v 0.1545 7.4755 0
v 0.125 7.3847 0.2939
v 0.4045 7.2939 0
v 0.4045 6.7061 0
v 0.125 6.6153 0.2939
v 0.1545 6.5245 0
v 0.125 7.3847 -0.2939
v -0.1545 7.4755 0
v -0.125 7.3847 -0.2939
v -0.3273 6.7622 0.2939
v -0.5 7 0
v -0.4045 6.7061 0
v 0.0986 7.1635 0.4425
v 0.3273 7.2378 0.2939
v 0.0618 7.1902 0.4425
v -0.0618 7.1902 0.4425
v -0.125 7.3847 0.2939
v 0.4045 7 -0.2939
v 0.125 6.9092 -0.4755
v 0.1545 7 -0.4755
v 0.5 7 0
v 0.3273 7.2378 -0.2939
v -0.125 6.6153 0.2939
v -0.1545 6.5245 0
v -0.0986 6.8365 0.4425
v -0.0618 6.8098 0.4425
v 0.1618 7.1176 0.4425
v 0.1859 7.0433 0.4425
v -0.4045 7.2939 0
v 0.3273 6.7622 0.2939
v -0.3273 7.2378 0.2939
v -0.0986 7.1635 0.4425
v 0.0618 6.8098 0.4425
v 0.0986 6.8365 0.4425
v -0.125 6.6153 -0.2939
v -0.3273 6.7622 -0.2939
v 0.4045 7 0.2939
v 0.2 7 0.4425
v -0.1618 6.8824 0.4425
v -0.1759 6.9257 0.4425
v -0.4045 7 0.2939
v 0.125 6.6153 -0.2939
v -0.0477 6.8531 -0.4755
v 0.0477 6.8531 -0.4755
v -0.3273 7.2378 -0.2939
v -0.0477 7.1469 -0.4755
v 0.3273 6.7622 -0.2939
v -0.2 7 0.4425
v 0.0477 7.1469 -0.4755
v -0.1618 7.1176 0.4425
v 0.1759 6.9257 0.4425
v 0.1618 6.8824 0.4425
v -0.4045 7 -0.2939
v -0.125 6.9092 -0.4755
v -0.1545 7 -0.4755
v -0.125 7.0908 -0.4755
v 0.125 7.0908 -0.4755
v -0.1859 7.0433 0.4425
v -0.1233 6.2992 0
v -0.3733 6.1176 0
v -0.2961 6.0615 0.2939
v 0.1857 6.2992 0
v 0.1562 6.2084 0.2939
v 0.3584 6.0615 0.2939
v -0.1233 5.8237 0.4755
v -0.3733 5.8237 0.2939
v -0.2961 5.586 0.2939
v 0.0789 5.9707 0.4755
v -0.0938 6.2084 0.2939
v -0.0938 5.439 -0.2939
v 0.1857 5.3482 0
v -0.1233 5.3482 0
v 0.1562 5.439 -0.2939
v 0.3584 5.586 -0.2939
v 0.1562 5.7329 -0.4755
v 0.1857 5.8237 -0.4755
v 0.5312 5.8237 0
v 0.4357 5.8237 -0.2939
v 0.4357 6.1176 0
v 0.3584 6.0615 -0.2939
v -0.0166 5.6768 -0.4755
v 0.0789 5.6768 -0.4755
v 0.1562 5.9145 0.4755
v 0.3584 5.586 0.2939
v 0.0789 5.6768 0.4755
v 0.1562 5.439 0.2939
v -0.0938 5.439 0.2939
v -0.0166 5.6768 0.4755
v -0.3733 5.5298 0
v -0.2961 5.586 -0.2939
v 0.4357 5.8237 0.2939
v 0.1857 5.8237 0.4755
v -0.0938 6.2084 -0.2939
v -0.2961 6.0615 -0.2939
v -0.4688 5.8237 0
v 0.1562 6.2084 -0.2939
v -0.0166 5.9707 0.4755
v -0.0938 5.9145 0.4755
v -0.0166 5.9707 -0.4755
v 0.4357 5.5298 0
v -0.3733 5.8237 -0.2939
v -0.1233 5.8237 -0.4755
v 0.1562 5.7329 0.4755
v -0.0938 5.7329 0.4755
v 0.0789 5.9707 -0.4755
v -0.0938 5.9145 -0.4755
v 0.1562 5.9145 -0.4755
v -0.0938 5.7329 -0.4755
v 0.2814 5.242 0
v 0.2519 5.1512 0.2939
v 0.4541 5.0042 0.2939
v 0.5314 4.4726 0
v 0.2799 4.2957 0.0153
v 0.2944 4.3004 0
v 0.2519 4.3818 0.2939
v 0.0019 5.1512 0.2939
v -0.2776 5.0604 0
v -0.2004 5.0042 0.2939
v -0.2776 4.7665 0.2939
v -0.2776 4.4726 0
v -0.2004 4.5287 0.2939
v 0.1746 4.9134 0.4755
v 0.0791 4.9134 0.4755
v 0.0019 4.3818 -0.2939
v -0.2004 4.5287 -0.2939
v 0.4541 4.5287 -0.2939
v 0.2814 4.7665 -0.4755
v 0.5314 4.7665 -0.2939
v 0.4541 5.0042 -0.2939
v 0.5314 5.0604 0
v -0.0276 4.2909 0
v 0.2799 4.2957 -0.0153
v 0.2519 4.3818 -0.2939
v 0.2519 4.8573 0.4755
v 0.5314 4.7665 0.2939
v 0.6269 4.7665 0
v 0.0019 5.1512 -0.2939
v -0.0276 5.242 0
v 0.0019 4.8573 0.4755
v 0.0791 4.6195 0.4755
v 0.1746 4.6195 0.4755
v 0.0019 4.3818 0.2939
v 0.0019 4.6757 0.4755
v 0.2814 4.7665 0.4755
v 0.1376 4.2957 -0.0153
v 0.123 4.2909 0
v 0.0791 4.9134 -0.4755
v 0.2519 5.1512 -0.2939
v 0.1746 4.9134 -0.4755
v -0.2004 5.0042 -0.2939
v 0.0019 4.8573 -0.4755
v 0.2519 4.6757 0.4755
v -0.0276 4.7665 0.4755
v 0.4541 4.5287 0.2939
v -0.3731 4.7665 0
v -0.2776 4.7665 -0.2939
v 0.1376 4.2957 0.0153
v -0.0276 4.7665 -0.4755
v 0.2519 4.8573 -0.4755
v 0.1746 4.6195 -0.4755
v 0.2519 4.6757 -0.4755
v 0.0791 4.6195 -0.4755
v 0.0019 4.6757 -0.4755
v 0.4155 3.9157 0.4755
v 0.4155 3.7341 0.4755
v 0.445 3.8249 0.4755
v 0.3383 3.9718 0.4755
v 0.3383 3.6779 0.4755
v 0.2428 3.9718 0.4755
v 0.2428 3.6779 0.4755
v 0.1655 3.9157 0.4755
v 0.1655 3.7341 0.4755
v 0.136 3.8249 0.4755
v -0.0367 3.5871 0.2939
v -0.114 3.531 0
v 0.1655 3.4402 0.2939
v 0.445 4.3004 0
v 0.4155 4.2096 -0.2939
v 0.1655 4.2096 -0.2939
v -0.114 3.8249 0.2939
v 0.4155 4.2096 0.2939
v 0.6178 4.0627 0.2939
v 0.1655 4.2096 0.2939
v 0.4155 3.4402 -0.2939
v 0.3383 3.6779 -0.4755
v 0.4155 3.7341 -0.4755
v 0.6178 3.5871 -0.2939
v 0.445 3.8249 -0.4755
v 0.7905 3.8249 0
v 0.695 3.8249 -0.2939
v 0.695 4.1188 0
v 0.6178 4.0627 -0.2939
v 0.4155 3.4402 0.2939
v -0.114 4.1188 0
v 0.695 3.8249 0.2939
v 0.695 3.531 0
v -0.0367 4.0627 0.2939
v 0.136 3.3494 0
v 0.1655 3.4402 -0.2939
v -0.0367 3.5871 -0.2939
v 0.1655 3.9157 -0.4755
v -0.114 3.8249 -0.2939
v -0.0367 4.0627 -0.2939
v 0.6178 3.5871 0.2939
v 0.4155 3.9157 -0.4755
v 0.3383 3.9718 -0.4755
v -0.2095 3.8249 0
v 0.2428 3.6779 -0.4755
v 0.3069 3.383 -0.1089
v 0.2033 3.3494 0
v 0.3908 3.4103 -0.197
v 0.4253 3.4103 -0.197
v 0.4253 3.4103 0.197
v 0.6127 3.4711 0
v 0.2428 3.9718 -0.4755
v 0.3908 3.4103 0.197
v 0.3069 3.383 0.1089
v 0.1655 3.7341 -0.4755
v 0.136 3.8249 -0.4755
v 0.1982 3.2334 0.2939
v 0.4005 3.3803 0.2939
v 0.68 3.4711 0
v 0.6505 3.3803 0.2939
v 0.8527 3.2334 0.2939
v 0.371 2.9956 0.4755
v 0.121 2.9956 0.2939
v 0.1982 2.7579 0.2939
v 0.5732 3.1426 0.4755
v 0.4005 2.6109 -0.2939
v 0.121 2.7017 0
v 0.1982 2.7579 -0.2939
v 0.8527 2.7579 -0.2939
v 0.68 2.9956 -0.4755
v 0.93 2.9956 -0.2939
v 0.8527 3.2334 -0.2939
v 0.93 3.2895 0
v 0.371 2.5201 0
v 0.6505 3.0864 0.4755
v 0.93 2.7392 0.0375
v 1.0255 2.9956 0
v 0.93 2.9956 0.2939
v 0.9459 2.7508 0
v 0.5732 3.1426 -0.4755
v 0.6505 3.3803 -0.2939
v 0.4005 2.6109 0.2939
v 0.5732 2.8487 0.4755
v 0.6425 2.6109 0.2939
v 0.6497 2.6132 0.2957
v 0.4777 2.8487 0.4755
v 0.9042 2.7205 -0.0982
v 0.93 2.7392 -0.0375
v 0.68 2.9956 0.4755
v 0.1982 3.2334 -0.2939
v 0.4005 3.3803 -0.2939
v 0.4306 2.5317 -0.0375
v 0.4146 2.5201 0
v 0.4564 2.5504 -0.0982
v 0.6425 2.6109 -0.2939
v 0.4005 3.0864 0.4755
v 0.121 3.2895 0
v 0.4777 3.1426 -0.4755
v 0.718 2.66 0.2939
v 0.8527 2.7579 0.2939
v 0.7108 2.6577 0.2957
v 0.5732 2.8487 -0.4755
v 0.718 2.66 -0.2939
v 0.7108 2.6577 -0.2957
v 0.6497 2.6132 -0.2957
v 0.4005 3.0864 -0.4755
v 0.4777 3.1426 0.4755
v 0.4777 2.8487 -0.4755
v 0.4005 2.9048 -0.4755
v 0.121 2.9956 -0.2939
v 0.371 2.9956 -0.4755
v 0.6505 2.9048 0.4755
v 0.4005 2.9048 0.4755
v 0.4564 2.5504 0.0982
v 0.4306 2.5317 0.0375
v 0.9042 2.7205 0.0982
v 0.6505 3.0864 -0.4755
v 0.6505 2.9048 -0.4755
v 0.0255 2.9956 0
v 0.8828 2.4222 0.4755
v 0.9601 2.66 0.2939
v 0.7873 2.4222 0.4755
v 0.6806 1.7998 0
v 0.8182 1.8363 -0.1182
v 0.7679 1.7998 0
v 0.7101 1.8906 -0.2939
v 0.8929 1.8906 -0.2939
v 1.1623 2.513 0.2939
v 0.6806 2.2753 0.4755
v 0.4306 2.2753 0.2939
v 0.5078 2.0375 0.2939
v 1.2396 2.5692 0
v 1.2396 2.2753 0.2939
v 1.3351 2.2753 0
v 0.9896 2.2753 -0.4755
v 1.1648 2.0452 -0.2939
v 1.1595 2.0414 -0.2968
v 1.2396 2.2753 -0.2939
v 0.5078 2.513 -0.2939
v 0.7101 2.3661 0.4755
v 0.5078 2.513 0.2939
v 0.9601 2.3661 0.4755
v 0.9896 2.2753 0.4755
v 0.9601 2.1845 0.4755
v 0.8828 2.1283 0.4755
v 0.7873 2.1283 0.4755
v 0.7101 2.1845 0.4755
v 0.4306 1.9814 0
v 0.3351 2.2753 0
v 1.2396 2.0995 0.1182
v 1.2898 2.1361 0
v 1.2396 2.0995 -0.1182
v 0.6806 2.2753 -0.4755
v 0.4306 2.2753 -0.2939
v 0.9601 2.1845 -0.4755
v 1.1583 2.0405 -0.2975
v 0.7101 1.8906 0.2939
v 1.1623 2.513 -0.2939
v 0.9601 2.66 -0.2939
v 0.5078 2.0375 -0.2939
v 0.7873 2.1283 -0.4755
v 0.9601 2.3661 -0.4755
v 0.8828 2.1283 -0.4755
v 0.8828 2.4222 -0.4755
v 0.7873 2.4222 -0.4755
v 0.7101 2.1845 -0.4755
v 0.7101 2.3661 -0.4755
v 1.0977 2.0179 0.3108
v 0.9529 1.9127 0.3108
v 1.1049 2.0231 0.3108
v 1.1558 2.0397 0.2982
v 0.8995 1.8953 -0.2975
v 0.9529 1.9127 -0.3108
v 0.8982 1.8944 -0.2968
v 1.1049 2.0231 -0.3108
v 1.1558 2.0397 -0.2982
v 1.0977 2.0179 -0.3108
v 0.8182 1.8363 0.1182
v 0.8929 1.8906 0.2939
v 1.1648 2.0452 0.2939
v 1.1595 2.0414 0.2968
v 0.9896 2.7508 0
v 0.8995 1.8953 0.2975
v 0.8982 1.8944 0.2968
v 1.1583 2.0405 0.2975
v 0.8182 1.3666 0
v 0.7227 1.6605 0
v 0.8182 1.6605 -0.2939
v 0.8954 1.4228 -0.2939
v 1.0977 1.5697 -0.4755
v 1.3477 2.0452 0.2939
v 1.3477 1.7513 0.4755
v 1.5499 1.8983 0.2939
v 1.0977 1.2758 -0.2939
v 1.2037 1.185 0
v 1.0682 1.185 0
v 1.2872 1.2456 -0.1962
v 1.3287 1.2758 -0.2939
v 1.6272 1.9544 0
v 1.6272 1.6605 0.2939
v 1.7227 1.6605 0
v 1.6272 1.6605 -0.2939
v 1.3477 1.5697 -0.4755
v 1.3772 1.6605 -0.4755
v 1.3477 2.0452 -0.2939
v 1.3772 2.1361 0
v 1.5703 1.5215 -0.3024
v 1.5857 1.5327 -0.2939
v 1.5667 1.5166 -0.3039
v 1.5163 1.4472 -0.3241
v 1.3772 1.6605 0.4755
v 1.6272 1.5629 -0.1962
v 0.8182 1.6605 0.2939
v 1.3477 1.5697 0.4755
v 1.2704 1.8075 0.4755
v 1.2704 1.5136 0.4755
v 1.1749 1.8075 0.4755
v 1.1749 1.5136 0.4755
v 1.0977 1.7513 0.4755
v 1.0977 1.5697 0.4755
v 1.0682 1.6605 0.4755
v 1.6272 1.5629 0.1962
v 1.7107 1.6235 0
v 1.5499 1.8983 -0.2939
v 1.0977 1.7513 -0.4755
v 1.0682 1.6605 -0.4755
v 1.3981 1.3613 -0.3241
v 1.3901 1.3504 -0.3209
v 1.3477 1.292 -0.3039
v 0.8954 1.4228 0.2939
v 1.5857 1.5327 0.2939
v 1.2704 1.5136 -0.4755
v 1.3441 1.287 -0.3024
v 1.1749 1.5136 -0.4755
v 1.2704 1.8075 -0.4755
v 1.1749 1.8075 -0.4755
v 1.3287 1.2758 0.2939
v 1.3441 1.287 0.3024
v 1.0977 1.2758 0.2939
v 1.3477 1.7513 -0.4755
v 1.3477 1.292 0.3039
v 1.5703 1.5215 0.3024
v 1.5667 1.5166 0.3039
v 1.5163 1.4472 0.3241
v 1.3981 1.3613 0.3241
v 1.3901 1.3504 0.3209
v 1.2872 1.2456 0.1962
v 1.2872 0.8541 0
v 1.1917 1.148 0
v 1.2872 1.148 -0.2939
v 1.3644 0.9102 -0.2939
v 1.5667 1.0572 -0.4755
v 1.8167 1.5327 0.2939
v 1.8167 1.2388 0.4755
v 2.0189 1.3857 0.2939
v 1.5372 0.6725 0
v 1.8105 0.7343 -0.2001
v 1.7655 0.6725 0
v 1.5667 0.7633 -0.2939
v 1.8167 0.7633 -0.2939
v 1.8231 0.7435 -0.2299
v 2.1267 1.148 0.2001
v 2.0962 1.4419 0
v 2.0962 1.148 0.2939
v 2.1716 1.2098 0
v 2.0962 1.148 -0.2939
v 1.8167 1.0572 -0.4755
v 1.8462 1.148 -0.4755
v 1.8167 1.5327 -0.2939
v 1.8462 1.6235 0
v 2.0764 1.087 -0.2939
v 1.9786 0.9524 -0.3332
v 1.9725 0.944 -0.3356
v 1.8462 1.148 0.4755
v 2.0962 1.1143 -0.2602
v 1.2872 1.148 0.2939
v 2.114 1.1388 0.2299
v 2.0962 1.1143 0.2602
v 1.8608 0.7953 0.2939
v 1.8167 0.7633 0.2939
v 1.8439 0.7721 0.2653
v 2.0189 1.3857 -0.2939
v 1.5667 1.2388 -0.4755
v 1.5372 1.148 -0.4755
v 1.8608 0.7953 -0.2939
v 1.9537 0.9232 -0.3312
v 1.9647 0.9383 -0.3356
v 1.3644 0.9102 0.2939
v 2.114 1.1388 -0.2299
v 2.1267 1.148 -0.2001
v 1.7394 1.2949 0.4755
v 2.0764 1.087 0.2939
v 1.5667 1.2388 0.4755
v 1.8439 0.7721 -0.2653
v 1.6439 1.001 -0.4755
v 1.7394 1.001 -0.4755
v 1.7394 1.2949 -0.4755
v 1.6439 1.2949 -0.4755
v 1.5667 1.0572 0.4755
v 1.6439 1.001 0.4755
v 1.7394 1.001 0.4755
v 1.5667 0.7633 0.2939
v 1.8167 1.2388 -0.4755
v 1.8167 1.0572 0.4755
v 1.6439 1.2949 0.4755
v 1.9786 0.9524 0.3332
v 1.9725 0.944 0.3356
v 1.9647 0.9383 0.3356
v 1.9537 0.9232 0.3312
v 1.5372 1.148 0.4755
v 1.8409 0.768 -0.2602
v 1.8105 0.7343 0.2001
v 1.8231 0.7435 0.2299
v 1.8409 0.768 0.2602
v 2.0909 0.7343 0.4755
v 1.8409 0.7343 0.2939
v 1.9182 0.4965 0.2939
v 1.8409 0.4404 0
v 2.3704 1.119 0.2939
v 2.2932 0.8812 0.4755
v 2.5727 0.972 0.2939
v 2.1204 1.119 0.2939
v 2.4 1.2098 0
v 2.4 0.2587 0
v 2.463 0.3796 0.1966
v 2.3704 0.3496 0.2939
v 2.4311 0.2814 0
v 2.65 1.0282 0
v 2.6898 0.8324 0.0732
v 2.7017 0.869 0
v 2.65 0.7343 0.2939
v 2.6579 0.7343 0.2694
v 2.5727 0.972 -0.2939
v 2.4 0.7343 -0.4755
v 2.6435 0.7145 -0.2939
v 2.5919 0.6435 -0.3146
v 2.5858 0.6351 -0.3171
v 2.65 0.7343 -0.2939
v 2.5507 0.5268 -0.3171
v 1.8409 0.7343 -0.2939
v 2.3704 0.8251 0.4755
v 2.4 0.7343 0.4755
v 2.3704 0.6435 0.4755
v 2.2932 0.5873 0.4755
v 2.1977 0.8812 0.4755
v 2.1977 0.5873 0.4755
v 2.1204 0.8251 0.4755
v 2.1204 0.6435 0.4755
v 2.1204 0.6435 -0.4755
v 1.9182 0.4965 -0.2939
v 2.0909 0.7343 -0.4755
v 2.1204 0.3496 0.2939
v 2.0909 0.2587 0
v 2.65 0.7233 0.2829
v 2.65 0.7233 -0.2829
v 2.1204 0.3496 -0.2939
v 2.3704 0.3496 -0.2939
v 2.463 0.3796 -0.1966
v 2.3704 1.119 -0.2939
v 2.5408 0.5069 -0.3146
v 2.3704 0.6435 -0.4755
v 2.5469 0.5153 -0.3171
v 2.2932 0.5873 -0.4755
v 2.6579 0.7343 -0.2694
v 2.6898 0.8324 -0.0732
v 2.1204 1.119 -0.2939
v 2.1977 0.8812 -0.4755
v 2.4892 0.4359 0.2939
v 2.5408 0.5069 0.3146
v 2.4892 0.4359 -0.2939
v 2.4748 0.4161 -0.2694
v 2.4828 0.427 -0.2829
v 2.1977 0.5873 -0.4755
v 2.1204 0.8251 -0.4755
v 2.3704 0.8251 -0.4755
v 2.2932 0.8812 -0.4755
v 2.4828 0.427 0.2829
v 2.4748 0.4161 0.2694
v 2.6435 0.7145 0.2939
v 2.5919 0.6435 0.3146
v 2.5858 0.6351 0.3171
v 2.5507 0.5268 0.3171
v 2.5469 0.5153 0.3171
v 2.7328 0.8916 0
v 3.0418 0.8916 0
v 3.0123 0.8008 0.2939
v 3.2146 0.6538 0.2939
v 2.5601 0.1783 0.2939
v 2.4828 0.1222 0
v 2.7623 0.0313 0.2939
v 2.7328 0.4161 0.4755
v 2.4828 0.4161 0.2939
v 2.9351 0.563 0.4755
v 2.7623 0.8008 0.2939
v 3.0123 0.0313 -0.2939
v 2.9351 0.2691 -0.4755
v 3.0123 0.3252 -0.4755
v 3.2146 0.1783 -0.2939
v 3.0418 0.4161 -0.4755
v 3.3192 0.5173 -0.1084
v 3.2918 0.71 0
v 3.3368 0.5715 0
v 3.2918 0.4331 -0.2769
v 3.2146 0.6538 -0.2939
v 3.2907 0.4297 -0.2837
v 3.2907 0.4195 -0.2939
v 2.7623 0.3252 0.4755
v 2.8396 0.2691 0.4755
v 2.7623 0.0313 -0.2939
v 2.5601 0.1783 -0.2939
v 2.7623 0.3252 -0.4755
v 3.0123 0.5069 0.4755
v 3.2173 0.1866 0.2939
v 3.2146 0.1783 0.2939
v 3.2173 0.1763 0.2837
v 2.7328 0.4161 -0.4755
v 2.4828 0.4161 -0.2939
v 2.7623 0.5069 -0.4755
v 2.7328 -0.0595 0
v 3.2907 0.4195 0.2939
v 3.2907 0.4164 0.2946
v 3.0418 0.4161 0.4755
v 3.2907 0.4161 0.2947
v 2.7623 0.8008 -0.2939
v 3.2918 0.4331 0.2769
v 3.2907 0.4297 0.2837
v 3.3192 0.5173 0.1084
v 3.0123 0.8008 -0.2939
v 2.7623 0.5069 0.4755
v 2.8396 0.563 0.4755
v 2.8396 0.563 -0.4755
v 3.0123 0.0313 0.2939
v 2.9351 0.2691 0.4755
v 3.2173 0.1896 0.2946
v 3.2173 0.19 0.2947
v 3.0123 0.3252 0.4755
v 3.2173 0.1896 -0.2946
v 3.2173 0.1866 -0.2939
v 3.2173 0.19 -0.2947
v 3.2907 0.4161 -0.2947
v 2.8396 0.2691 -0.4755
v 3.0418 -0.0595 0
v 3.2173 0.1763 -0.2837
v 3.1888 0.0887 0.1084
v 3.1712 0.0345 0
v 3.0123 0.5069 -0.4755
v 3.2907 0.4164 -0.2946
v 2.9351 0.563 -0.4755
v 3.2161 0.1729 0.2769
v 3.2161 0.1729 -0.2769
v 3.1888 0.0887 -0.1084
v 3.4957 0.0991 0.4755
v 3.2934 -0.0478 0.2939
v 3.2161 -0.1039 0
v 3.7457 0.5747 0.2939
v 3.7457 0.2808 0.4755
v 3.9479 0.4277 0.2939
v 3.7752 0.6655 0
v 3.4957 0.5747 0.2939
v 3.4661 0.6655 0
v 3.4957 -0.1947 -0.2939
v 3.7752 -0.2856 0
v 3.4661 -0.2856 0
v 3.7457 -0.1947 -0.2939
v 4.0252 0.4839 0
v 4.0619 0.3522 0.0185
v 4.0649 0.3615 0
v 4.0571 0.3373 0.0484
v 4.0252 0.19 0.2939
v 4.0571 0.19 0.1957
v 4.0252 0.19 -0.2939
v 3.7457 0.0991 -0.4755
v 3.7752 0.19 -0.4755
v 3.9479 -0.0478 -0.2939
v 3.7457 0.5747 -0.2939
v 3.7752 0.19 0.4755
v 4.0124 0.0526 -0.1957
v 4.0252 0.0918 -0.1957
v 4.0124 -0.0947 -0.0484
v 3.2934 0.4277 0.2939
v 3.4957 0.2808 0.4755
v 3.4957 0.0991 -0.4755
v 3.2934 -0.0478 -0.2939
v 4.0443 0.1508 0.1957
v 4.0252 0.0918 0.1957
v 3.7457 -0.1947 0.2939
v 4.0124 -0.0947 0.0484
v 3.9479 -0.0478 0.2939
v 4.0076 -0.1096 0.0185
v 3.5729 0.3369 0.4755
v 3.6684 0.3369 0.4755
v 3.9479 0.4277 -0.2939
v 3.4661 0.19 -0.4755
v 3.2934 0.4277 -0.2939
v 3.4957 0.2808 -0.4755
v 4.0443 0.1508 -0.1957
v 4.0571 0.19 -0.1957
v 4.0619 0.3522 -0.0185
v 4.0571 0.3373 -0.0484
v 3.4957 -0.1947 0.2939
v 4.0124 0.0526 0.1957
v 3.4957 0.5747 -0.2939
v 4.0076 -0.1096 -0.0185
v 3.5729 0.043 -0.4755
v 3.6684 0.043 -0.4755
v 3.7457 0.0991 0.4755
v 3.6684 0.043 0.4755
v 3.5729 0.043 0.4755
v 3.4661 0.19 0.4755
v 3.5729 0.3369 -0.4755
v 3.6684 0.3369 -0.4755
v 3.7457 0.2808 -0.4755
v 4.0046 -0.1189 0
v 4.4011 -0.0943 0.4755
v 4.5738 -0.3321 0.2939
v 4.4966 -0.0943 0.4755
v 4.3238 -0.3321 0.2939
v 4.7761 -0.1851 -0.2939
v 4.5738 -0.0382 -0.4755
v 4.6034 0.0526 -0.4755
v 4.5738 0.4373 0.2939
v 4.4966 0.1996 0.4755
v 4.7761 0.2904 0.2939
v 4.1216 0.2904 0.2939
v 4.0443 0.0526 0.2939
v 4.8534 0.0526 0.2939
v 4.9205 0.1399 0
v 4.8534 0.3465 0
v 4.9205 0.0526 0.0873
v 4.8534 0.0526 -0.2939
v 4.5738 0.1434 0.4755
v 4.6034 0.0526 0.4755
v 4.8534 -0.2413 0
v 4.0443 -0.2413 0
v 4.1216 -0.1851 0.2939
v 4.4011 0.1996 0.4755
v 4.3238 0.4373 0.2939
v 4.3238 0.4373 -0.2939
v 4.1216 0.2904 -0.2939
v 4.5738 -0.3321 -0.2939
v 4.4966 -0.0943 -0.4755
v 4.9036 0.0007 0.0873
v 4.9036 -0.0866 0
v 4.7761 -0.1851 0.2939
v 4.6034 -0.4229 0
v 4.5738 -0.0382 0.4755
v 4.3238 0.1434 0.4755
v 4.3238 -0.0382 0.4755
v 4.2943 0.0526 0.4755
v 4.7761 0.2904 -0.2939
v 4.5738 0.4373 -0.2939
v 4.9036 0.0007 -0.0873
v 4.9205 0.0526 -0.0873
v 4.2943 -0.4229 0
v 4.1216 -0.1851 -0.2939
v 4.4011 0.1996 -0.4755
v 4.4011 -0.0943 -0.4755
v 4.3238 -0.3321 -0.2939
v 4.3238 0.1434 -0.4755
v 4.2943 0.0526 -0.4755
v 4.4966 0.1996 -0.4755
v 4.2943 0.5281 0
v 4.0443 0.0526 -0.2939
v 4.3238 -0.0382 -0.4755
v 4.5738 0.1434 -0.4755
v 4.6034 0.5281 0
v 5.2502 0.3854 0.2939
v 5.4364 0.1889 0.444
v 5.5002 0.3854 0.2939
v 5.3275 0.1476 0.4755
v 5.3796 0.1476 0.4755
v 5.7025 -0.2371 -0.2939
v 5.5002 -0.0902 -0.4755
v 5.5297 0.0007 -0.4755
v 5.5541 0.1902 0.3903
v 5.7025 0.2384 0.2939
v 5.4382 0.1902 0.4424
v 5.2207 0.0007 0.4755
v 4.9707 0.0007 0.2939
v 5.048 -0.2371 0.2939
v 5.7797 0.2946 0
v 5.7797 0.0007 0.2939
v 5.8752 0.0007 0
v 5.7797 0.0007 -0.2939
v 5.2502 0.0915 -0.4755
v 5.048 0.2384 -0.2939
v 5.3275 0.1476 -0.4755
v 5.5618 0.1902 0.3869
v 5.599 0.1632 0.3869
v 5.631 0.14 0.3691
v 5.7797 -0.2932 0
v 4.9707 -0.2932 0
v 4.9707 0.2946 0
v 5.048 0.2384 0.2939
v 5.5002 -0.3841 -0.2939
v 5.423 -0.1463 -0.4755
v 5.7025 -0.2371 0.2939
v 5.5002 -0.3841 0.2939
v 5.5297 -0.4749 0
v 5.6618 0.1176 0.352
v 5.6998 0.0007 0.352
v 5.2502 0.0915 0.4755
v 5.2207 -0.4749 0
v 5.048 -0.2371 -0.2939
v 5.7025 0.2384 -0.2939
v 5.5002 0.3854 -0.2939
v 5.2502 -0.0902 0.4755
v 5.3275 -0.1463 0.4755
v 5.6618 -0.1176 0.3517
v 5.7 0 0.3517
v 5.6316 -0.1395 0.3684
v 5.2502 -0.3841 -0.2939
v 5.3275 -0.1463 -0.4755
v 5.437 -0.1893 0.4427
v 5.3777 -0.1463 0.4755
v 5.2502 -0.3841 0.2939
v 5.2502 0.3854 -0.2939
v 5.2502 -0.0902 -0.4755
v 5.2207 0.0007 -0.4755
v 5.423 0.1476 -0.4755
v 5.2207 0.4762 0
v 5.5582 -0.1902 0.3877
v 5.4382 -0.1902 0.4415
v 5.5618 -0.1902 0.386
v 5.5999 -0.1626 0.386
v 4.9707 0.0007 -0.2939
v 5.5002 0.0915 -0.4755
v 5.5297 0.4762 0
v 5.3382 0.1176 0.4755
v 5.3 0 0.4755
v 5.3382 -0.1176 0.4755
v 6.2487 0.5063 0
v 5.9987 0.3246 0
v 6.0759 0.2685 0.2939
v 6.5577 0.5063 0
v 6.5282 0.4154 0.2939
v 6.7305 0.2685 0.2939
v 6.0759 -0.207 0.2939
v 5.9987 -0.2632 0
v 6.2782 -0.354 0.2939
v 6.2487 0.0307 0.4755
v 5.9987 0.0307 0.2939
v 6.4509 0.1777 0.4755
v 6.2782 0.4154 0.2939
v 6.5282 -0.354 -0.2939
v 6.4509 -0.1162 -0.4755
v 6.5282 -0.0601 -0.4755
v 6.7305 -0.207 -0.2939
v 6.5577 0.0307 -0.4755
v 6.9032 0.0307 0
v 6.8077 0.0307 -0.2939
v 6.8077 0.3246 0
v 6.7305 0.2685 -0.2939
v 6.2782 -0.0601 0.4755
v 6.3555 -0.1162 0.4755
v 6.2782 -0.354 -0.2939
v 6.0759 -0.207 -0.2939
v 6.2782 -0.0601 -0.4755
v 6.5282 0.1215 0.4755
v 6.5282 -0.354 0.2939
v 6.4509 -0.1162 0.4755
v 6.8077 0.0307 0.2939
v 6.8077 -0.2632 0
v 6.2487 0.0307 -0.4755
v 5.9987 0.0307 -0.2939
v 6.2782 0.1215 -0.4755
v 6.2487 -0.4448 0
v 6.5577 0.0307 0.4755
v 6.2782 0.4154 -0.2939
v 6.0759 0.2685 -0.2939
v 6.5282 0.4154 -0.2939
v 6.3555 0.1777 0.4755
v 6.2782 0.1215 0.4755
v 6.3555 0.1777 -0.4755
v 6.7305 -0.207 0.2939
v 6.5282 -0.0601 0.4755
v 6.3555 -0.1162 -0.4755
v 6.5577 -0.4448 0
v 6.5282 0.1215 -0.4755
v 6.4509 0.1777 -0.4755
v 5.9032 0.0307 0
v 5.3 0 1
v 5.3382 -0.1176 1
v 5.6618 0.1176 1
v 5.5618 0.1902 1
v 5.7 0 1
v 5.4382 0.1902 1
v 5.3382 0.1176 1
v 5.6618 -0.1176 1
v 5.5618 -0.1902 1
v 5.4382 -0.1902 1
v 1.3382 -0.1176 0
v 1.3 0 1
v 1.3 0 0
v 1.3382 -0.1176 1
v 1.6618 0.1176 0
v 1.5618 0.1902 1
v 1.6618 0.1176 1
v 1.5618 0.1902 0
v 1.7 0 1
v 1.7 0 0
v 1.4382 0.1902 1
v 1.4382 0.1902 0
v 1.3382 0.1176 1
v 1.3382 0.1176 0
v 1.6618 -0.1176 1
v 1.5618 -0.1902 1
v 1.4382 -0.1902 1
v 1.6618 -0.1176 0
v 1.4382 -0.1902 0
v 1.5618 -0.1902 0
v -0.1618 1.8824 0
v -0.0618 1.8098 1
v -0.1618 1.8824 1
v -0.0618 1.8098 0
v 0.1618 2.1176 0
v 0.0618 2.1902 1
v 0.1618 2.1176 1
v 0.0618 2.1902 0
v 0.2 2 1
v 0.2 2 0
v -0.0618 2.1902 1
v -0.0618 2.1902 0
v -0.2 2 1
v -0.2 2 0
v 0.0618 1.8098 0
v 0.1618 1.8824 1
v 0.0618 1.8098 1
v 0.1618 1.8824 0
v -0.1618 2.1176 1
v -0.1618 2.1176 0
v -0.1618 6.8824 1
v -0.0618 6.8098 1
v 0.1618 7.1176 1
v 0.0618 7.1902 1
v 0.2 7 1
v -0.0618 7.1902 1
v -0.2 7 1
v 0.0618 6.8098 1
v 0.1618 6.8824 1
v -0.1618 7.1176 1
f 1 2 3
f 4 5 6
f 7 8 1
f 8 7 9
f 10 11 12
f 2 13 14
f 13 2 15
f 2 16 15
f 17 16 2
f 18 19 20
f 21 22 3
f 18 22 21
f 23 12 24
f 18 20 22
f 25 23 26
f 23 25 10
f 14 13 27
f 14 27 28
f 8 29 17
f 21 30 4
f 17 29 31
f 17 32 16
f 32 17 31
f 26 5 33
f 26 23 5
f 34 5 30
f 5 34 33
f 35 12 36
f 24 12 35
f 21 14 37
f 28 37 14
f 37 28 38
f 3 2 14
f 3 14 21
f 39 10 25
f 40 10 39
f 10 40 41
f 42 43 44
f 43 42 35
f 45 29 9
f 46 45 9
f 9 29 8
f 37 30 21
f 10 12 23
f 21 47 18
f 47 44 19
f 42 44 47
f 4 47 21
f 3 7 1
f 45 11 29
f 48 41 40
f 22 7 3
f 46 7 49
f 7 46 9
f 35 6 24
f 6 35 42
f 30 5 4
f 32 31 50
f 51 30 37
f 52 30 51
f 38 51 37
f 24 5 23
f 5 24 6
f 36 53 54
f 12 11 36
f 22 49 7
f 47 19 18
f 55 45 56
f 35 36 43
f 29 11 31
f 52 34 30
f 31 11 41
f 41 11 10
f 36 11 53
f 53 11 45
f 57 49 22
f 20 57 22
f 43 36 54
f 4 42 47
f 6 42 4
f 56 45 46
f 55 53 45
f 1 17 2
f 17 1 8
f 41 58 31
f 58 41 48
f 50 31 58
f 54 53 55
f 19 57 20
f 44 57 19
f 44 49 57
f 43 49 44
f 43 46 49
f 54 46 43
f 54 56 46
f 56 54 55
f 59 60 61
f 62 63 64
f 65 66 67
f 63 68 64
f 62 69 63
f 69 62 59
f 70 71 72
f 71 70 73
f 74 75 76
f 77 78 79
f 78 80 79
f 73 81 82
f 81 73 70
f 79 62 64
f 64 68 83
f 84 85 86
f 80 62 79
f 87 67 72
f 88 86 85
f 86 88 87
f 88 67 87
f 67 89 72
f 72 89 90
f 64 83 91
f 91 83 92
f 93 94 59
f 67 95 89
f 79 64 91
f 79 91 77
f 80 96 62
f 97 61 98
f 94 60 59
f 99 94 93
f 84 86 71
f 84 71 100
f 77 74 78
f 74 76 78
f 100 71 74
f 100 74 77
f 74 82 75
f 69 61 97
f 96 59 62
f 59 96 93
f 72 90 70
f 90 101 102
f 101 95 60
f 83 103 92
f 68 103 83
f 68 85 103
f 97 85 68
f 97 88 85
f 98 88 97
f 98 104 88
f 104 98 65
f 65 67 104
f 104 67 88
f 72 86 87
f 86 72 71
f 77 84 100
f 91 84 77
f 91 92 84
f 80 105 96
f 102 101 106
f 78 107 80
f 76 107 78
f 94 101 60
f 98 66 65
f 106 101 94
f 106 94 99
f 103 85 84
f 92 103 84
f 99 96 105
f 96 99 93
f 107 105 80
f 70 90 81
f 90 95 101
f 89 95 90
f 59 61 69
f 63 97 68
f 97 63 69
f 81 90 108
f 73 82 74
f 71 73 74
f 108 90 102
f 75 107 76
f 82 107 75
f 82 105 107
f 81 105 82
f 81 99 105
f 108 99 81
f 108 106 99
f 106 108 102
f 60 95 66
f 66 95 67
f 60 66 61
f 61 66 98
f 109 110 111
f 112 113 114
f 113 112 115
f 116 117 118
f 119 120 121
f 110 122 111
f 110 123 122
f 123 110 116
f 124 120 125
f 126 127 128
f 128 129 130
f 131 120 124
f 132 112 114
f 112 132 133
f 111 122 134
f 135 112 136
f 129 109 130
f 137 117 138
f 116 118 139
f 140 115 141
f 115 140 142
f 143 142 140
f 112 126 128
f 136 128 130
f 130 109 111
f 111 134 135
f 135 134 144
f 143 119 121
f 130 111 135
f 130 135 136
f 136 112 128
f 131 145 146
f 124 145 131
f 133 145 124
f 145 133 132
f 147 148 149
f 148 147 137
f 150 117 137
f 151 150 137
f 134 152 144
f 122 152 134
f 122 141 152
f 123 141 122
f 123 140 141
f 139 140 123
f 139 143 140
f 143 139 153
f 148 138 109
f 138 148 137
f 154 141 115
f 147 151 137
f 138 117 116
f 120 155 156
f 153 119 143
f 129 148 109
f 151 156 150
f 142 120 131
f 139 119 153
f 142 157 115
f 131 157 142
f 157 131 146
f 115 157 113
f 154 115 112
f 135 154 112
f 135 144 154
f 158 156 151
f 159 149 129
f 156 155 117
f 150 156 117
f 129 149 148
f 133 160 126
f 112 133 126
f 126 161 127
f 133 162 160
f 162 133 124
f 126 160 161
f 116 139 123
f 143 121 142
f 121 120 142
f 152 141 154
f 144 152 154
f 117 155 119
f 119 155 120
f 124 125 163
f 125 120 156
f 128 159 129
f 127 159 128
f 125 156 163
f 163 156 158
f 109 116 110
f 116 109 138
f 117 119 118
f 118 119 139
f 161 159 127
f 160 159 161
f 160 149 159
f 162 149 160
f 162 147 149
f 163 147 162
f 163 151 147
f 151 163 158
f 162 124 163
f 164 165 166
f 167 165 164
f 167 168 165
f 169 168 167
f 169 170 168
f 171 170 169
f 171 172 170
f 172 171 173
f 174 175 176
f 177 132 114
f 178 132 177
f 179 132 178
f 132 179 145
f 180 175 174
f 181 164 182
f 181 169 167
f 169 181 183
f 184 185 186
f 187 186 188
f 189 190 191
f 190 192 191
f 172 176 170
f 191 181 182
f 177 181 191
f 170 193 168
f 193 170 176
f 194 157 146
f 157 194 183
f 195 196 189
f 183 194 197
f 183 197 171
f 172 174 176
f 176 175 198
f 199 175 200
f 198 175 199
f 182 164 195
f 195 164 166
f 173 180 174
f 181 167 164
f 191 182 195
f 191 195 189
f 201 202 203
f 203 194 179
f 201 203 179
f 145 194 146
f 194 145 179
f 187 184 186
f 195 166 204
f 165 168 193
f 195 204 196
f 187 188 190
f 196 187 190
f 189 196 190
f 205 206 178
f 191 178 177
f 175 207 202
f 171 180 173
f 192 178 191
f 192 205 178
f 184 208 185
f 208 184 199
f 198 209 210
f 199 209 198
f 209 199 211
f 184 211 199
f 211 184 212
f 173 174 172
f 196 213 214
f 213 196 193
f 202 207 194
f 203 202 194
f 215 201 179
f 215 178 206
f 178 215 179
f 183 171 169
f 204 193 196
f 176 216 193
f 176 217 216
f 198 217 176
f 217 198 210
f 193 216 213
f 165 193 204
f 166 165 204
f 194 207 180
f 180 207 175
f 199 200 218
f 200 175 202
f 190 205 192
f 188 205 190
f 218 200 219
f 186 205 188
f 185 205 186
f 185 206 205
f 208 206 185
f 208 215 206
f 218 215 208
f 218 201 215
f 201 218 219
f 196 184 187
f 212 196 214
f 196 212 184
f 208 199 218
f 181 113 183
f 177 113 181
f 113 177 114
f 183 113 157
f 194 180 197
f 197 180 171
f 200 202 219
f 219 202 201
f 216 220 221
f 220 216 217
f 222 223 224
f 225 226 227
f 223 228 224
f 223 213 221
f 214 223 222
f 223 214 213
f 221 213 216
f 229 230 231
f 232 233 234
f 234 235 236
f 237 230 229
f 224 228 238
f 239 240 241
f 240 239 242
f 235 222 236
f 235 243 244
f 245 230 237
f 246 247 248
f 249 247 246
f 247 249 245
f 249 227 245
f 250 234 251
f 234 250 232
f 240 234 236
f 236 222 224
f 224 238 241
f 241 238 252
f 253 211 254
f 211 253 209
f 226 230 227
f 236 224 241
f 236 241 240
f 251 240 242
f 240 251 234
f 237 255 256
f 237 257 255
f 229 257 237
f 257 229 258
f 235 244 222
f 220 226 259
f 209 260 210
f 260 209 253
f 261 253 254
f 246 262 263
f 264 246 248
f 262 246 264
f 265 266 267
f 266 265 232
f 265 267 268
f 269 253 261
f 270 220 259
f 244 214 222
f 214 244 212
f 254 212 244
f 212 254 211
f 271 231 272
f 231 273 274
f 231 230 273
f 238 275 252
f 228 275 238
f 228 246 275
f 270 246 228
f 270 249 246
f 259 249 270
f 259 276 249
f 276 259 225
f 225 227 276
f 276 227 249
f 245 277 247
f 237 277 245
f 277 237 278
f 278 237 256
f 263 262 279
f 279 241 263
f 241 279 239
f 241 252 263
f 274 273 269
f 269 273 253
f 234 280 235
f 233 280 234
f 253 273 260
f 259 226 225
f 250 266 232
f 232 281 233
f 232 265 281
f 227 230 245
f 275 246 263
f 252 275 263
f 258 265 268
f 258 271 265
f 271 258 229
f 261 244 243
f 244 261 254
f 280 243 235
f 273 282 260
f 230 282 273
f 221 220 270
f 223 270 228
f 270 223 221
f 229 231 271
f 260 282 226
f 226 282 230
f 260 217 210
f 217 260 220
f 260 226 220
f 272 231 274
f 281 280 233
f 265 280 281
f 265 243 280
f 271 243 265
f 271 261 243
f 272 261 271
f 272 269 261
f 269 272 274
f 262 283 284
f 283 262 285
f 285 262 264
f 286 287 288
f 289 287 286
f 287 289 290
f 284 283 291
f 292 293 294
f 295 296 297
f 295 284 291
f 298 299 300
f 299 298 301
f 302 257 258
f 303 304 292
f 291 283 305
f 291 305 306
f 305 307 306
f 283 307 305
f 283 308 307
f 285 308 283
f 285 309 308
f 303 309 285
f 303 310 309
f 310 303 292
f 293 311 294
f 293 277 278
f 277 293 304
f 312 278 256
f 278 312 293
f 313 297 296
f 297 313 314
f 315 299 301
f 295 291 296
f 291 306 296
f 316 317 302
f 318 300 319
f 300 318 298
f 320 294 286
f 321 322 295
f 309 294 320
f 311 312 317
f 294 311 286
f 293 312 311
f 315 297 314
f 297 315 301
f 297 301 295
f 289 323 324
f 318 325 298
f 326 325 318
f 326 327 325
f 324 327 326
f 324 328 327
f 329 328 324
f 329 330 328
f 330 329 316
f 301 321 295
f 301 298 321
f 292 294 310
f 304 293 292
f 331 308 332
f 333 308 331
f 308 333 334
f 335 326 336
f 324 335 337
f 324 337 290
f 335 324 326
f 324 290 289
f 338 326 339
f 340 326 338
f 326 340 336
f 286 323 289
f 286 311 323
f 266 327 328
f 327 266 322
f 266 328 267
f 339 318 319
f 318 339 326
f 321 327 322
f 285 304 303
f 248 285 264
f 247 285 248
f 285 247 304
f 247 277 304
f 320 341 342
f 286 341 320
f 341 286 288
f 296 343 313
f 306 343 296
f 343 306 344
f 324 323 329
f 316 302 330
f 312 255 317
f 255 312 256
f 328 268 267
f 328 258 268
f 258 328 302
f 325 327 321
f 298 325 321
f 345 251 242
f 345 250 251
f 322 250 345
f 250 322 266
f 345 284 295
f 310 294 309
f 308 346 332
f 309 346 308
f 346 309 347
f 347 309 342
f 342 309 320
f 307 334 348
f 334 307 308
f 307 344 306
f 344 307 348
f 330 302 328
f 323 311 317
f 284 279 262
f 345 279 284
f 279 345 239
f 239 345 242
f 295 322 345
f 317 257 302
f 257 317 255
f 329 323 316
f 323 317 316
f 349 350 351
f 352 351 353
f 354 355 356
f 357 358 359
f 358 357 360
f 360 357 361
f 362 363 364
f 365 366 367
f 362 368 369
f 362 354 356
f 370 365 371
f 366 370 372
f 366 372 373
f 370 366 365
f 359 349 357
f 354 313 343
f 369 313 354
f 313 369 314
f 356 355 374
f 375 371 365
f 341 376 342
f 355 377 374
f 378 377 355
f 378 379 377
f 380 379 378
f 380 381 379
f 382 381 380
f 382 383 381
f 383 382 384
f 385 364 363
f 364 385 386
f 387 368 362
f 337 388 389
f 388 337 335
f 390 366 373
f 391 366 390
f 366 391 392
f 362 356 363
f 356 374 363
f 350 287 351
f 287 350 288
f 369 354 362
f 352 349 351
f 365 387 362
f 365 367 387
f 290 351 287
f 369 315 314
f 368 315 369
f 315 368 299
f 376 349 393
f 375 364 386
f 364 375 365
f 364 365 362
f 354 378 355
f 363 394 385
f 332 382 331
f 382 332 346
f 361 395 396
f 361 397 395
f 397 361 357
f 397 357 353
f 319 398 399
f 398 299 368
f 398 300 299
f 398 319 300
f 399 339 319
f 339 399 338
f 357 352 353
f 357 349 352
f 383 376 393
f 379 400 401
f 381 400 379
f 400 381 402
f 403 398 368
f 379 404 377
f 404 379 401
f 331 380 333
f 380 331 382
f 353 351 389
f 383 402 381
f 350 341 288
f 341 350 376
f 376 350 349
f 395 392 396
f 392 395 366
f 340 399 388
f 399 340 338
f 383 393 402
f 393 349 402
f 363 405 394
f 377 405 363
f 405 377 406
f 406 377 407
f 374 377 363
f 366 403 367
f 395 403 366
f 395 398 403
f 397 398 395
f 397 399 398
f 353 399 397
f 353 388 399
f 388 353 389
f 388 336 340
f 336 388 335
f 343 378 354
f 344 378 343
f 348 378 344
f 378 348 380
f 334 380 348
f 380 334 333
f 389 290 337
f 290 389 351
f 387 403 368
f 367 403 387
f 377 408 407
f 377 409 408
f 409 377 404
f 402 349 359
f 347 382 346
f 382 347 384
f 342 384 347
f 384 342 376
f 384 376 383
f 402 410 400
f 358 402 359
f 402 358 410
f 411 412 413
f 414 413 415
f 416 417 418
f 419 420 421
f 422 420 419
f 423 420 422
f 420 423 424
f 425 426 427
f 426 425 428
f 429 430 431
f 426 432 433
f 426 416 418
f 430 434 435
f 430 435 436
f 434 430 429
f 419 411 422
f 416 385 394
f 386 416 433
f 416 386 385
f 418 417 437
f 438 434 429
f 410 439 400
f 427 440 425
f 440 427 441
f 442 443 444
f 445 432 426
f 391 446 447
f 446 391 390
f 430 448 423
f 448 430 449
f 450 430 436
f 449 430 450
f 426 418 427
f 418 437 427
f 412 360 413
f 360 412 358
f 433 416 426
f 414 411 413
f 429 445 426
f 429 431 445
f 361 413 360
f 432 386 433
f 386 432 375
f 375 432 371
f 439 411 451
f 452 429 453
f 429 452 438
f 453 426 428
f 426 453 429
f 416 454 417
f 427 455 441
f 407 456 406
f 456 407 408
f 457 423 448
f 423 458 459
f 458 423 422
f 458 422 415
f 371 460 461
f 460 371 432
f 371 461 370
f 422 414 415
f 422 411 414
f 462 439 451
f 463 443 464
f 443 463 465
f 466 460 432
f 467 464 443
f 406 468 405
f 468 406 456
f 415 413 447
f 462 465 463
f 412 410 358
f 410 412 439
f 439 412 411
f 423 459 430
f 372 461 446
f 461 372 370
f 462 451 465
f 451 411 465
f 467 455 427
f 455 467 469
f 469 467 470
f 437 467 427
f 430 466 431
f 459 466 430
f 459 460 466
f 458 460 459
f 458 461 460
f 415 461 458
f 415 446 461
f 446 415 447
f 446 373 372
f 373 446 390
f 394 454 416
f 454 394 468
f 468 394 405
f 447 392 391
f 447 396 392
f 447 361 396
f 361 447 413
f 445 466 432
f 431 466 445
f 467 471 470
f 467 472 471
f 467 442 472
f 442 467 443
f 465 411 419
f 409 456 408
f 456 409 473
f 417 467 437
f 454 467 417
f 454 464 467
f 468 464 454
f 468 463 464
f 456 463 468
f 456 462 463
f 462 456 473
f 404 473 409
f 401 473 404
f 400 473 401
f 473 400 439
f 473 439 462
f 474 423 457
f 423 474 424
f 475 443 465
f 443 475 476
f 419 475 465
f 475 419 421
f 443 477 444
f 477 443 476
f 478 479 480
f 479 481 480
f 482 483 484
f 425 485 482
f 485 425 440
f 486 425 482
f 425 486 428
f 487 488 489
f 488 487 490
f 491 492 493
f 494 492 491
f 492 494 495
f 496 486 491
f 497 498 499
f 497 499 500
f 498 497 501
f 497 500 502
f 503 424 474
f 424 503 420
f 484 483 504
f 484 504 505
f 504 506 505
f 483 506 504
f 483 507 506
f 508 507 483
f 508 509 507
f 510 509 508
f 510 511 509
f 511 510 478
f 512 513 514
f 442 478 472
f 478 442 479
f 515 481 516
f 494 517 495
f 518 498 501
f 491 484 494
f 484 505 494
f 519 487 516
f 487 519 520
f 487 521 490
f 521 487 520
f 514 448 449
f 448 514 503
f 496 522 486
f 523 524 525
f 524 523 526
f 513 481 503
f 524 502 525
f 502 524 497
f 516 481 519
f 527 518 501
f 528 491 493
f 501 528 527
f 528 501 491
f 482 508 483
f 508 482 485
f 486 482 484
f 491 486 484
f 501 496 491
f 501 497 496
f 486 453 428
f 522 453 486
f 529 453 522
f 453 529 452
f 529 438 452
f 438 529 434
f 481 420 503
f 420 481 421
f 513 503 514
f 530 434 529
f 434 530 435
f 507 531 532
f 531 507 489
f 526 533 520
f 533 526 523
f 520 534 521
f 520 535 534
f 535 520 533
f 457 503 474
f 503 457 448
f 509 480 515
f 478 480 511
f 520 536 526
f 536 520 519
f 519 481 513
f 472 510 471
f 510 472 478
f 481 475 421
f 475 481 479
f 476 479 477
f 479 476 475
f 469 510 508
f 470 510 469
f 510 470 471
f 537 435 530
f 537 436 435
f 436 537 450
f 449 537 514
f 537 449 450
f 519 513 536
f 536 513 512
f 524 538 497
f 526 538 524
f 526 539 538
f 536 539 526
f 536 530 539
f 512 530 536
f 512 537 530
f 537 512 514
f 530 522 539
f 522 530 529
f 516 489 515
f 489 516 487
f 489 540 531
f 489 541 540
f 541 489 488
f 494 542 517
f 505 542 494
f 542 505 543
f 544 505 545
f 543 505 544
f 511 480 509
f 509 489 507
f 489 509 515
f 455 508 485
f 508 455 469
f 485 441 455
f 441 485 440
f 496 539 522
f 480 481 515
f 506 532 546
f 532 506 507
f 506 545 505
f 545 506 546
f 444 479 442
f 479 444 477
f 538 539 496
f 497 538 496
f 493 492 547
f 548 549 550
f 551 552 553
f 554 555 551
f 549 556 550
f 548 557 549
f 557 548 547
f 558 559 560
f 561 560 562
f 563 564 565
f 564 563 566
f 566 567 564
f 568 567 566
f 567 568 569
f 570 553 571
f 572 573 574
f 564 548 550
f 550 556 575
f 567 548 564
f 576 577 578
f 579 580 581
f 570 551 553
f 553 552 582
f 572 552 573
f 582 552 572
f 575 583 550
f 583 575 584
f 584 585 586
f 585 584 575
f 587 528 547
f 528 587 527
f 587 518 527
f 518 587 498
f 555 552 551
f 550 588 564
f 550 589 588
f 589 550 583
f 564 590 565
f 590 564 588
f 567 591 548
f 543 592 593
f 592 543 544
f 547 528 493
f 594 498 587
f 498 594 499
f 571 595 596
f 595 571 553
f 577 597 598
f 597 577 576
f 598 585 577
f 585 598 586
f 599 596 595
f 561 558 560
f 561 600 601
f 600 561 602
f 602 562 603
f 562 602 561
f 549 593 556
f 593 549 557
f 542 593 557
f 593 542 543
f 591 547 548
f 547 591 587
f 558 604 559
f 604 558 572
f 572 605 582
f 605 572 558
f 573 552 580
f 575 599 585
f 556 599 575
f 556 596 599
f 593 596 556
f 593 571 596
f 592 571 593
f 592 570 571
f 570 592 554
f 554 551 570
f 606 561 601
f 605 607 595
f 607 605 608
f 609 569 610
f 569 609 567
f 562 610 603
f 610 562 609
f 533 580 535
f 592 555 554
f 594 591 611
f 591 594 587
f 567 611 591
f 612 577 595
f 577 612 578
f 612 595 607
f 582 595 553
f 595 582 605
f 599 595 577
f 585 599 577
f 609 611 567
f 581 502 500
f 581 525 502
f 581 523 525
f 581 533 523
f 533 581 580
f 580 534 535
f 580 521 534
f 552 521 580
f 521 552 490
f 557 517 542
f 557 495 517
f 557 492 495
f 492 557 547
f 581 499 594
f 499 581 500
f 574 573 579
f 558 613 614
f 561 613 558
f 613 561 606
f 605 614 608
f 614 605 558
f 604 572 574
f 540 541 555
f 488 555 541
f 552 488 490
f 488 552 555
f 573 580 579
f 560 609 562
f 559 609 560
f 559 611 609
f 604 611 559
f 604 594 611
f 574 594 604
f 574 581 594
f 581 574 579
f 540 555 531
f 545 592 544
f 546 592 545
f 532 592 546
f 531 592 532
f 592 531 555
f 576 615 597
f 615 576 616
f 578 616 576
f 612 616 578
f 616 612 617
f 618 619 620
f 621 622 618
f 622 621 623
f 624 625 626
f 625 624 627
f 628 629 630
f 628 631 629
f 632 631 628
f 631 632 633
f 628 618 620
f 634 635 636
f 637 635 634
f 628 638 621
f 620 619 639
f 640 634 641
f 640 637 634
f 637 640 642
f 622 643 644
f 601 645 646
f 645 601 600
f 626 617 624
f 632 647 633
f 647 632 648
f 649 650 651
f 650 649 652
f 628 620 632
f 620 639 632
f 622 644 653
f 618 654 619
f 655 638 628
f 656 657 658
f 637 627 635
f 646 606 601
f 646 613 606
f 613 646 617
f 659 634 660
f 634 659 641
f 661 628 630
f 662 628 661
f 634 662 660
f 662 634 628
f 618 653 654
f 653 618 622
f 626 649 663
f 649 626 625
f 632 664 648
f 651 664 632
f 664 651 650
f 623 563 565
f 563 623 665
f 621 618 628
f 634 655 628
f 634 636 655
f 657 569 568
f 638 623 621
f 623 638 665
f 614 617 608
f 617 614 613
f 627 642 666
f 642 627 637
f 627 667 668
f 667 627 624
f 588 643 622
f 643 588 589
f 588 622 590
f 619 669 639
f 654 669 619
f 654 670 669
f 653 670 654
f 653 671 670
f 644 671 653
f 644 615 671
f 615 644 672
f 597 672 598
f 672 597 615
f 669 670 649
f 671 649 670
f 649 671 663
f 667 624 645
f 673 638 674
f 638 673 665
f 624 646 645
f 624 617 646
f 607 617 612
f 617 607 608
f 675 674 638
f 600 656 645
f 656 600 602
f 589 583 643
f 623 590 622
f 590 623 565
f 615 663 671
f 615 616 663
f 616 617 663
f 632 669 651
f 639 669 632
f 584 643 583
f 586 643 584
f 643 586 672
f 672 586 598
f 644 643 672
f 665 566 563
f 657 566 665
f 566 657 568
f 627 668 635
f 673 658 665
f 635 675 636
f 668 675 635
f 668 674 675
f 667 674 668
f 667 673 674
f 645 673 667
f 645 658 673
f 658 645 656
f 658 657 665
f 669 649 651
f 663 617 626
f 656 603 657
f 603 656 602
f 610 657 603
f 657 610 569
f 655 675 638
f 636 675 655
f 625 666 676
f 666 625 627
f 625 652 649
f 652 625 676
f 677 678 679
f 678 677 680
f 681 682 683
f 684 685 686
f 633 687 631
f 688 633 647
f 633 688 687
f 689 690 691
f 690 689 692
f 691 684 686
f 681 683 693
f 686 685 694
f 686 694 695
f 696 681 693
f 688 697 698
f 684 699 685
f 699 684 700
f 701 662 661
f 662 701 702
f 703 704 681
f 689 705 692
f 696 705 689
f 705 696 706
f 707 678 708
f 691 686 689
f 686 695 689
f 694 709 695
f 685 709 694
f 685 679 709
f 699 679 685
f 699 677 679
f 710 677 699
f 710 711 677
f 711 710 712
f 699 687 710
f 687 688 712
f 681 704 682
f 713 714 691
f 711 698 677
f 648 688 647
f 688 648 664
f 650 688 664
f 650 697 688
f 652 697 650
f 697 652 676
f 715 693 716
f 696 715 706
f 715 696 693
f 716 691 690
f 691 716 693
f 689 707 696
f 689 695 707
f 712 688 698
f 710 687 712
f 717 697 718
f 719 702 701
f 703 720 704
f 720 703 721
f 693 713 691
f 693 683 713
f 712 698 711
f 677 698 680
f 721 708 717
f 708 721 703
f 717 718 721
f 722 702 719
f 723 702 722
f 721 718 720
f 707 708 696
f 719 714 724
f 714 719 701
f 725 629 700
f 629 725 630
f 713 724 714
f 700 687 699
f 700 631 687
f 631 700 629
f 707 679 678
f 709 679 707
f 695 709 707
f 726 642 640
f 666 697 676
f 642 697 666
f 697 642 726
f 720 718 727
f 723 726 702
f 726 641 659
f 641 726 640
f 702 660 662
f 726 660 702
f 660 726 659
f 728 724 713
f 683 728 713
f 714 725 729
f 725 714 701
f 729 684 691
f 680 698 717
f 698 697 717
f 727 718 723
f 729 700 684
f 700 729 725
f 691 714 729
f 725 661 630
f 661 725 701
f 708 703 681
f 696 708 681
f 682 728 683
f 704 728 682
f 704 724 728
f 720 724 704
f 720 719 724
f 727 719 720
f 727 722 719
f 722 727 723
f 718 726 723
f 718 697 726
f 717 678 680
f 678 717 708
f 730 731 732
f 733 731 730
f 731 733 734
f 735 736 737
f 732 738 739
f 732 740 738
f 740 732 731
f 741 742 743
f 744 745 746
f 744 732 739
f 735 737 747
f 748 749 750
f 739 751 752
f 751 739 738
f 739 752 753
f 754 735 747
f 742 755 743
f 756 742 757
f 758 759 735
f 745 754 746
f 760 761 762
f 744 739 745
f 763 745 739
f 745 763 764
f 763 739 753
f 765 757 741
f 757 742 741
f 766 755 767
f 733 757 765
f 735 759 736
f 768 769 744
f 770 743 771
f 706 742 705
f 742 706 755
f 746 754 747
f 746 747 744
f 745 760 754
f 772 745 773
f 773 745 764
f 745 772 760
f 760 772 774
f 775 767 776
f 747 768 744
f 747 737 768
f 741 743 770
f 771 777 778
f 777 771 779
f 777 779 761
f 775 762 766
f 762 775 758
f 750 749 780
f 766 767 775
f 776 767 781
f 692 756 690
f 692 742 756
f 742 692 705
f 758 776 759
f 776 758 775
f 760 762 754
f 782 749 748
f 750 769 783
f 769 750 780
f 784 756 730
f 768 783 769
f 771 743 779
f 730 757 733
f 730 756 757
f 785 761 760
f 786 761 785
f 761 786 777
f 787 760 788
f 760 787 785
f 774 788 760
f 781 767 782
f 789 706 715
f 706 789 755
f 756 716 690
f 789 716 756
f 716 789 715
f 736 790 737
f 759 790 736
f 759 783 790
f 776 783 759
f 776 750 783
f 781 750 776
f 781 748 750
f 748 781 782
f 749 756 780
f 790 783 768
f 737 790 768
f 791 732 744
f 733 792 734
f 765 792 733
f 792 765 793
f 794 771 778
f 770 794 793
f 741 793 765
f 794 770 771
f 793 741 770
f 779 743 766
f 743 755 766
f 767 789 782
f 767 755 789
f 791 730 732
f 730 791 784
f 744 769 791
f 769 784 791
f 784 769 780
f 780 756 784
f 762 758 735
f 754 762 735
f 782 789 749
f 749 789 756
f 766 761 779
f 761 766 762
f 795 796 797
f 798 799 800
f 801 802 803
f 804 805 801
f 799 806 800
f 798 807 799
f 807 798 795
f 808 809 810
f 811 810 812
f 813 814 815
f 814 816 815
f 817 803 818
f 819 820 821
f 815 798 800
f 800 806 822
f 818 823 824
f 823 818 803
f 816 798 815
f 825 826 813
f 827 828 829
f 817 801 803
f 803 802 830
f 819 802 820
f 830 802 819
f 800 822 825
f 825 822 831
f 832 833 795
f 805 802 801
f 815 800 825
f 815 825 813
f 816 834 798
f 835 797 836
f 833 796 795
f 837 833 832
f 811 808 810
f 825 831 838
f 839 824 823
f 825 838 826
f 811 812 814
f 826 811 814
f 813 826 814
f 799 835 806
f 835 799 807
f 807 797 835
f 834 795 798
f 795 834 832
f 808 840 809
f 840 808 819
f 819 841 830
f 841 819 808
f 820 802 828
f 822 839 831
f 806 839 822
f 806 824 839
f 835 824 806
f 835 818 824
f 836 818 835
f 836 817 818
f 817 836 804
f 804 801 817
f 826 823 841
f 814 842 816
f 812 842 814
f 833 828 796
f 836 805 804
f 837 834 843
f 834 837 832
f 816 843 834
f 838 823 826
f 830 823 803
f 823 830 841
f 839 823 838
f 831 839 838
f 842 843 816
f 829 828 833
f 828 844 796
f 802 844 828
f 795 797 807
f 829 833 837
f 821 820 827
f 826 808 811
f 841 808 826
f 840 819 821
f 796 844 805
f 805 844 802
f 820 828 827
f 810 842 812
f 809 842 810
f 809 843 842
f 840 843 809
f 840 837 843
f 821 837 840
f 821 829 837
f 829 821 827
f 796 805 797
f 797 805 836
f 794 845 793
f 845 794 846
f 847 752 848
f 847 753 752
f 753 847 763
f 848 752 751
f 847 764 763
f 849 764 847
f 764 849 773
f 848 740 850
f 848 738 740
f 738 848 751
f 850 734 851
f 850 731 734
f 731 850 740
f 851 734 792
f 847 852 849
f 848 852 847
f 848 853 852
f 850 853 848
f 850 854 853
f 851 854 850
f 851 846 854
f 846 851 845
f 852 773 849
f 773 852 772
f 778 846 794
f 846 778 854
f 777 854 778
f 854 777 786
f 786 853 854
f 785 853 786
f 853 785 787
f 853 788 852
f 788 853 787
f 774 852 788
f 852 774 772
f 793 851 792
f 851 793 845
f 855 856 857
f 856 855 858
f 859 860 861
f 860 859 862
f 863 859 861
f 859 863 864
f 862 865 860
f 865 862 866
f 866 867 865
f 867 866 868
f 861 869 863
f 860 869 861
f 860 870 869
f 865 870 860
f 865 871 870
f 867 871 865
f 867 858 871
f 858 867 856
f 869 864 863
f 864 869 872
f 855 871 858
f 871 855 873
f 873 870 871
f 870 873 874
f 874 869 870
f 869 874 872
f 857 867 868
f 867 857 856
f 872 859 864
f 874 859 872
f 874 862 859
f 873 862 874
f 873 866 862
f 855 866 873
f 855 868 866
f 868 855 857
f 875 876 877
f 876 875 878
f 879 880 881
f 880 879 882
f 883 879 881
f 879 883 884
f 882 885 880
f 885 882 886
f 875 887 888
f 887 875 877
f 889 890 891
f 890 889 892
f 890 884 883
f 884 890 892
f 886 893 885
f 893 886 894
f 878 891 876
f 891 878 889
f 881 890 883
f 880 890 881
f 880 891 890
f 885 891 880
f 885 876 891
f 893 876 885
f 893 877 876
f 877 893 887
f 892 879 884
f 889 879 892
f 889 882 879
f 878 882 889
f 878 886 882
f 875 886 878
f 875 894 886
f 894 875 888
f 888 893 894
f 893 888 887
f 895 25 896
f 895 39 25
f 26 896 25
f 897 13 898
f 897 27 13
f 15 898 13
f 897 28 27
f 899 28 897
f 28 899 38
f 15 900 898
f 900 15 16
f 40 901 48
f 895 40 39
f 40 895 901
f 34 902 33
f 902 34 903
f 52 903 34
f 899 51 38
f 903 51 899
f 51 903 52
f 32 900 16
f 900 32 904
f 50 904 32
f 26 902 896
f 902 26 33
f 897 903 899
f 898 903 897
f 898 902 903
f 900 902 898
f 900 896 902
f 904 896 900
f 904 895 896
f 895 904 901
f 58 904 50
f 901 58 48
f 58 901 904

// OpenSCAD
/*     functions for the distances    */

// roughly the size of parts of curves,
// is a global value
fs = 0.5;

// distance between two points
function dist(a, b) = len(a)==2?
sqrt(                 // two dimensions
    (a[0]-b[0])^2
    +(a[1]-b[1])^2
    ):
sqrt(                 // three dimensions
    (a[0]-b[0])^2
    +(a[1]-b[1])^2
    +(a[2]-b[2])^2
    );

// length of curve
  function length(pts) = [
    // three control points
    if (len(pts) == 3)
        0.43 * dist(pts[0], pts[1])
      + 0.53 * dist(pts[0], pts[2])
      + 0.43 * dist(pts[1], pts[2])
    // four control points
    else if (len(pts) == 4)
        0.35 * dist(pts[0], pts[1])
      + 0.40 * dist(pts[0], pts[2])
      + 0.23 * dist(pts[0], pts[3])
      - 0.09 * dist(pts[1], pts[2])
      + 0.40 * dist(pts[1], pts[2])
    // five control points
    else if (len(pts) == 5)
        0.32 * dist(pts[0], pts[1])
      + 0.35 * dist(pts[0], pts[2])
      + 0.23 * dist(pts[0], pts[3])
      + 0.10 * dist(pts[0], pts[4])
      - 0.13 * dist(pts[1], pts[2])
      + 0.20 * dist(pts[1], pts[3])
      + 0.23 * dist(pts[1], pts[4])
      - 0.13 * dist(pts[2], pts[3])
      + 0.35 * dist(pts[2], pts[4])
      + 0.32 * dist(pts[3], pts[4])
    else
        echo("Wrong number of points")]
  [0];       // makes list into number
  
 /*     calculating the points      */
 
  // determine fn
function b_curv(pts, n) =
  let (fn=
  // is n given? if so fn = n
  n ? n :
  // if no n is given,
  // are there two controlpoints?
  len(pts) == 2 ?
  // if yes: fn = 2
  2 :
  // and if no, calculate:
  length(pts)/fs)
  // now knowing fn,
  // call b_pts() and concatenate points
    [for (i= [0:fn]) 
      concat(b_pts(pts, 1/(fn-1), i))];

// calculate singular points
function b_pts(pts, fn, idx) =
  // has pts more than two points?
  len(pts) > 2 ?
  // it calls itself in smaller portions
    b_pts([for(i=[0:len(pts)-2])
        pts[i]], fn, idx) * fn*idx
      + b_pts([for(i=[1:len(pts)-1])
        pts[i]], fn, idx) * (1-fn*idx)
  // at two points we do the familiar
  // 'p1 · [0...1] + p2 · [1...0]'
    : pts[0] * fn*idx
      + pts[1] * (1-fn*idx);


/*     displaying     */  
      
// points
p1 = [5.5, 0];
p2 = [1.5, 0];
p3 = [0, 2];
p4 = [0, 7];

// calculating the points
points = b_curv([p1, p2, p3, p4]);
//points = b_curv([p2, p3]);

// displaying the calculated points
rainbow(points);

// displaying points as a rainbow
module rainbow (points) {
  for (i= [0 : len(points)-1 ])
  color([cos(20*i)/2+0.5,  // red
        -sin(20*i)/2+0.5,  // green
        -cos(20*i)/2+0.5,  // blue
        1])                // alpha
translate(points[i]) sphere(0.5, $fn=10);
}

// displaying [p1 .. p4]
for (i=[p1, p2, p3, p4])
  translate(i) color("black")
    cylinder(1, 0.2, 0.2, $fn=10);
